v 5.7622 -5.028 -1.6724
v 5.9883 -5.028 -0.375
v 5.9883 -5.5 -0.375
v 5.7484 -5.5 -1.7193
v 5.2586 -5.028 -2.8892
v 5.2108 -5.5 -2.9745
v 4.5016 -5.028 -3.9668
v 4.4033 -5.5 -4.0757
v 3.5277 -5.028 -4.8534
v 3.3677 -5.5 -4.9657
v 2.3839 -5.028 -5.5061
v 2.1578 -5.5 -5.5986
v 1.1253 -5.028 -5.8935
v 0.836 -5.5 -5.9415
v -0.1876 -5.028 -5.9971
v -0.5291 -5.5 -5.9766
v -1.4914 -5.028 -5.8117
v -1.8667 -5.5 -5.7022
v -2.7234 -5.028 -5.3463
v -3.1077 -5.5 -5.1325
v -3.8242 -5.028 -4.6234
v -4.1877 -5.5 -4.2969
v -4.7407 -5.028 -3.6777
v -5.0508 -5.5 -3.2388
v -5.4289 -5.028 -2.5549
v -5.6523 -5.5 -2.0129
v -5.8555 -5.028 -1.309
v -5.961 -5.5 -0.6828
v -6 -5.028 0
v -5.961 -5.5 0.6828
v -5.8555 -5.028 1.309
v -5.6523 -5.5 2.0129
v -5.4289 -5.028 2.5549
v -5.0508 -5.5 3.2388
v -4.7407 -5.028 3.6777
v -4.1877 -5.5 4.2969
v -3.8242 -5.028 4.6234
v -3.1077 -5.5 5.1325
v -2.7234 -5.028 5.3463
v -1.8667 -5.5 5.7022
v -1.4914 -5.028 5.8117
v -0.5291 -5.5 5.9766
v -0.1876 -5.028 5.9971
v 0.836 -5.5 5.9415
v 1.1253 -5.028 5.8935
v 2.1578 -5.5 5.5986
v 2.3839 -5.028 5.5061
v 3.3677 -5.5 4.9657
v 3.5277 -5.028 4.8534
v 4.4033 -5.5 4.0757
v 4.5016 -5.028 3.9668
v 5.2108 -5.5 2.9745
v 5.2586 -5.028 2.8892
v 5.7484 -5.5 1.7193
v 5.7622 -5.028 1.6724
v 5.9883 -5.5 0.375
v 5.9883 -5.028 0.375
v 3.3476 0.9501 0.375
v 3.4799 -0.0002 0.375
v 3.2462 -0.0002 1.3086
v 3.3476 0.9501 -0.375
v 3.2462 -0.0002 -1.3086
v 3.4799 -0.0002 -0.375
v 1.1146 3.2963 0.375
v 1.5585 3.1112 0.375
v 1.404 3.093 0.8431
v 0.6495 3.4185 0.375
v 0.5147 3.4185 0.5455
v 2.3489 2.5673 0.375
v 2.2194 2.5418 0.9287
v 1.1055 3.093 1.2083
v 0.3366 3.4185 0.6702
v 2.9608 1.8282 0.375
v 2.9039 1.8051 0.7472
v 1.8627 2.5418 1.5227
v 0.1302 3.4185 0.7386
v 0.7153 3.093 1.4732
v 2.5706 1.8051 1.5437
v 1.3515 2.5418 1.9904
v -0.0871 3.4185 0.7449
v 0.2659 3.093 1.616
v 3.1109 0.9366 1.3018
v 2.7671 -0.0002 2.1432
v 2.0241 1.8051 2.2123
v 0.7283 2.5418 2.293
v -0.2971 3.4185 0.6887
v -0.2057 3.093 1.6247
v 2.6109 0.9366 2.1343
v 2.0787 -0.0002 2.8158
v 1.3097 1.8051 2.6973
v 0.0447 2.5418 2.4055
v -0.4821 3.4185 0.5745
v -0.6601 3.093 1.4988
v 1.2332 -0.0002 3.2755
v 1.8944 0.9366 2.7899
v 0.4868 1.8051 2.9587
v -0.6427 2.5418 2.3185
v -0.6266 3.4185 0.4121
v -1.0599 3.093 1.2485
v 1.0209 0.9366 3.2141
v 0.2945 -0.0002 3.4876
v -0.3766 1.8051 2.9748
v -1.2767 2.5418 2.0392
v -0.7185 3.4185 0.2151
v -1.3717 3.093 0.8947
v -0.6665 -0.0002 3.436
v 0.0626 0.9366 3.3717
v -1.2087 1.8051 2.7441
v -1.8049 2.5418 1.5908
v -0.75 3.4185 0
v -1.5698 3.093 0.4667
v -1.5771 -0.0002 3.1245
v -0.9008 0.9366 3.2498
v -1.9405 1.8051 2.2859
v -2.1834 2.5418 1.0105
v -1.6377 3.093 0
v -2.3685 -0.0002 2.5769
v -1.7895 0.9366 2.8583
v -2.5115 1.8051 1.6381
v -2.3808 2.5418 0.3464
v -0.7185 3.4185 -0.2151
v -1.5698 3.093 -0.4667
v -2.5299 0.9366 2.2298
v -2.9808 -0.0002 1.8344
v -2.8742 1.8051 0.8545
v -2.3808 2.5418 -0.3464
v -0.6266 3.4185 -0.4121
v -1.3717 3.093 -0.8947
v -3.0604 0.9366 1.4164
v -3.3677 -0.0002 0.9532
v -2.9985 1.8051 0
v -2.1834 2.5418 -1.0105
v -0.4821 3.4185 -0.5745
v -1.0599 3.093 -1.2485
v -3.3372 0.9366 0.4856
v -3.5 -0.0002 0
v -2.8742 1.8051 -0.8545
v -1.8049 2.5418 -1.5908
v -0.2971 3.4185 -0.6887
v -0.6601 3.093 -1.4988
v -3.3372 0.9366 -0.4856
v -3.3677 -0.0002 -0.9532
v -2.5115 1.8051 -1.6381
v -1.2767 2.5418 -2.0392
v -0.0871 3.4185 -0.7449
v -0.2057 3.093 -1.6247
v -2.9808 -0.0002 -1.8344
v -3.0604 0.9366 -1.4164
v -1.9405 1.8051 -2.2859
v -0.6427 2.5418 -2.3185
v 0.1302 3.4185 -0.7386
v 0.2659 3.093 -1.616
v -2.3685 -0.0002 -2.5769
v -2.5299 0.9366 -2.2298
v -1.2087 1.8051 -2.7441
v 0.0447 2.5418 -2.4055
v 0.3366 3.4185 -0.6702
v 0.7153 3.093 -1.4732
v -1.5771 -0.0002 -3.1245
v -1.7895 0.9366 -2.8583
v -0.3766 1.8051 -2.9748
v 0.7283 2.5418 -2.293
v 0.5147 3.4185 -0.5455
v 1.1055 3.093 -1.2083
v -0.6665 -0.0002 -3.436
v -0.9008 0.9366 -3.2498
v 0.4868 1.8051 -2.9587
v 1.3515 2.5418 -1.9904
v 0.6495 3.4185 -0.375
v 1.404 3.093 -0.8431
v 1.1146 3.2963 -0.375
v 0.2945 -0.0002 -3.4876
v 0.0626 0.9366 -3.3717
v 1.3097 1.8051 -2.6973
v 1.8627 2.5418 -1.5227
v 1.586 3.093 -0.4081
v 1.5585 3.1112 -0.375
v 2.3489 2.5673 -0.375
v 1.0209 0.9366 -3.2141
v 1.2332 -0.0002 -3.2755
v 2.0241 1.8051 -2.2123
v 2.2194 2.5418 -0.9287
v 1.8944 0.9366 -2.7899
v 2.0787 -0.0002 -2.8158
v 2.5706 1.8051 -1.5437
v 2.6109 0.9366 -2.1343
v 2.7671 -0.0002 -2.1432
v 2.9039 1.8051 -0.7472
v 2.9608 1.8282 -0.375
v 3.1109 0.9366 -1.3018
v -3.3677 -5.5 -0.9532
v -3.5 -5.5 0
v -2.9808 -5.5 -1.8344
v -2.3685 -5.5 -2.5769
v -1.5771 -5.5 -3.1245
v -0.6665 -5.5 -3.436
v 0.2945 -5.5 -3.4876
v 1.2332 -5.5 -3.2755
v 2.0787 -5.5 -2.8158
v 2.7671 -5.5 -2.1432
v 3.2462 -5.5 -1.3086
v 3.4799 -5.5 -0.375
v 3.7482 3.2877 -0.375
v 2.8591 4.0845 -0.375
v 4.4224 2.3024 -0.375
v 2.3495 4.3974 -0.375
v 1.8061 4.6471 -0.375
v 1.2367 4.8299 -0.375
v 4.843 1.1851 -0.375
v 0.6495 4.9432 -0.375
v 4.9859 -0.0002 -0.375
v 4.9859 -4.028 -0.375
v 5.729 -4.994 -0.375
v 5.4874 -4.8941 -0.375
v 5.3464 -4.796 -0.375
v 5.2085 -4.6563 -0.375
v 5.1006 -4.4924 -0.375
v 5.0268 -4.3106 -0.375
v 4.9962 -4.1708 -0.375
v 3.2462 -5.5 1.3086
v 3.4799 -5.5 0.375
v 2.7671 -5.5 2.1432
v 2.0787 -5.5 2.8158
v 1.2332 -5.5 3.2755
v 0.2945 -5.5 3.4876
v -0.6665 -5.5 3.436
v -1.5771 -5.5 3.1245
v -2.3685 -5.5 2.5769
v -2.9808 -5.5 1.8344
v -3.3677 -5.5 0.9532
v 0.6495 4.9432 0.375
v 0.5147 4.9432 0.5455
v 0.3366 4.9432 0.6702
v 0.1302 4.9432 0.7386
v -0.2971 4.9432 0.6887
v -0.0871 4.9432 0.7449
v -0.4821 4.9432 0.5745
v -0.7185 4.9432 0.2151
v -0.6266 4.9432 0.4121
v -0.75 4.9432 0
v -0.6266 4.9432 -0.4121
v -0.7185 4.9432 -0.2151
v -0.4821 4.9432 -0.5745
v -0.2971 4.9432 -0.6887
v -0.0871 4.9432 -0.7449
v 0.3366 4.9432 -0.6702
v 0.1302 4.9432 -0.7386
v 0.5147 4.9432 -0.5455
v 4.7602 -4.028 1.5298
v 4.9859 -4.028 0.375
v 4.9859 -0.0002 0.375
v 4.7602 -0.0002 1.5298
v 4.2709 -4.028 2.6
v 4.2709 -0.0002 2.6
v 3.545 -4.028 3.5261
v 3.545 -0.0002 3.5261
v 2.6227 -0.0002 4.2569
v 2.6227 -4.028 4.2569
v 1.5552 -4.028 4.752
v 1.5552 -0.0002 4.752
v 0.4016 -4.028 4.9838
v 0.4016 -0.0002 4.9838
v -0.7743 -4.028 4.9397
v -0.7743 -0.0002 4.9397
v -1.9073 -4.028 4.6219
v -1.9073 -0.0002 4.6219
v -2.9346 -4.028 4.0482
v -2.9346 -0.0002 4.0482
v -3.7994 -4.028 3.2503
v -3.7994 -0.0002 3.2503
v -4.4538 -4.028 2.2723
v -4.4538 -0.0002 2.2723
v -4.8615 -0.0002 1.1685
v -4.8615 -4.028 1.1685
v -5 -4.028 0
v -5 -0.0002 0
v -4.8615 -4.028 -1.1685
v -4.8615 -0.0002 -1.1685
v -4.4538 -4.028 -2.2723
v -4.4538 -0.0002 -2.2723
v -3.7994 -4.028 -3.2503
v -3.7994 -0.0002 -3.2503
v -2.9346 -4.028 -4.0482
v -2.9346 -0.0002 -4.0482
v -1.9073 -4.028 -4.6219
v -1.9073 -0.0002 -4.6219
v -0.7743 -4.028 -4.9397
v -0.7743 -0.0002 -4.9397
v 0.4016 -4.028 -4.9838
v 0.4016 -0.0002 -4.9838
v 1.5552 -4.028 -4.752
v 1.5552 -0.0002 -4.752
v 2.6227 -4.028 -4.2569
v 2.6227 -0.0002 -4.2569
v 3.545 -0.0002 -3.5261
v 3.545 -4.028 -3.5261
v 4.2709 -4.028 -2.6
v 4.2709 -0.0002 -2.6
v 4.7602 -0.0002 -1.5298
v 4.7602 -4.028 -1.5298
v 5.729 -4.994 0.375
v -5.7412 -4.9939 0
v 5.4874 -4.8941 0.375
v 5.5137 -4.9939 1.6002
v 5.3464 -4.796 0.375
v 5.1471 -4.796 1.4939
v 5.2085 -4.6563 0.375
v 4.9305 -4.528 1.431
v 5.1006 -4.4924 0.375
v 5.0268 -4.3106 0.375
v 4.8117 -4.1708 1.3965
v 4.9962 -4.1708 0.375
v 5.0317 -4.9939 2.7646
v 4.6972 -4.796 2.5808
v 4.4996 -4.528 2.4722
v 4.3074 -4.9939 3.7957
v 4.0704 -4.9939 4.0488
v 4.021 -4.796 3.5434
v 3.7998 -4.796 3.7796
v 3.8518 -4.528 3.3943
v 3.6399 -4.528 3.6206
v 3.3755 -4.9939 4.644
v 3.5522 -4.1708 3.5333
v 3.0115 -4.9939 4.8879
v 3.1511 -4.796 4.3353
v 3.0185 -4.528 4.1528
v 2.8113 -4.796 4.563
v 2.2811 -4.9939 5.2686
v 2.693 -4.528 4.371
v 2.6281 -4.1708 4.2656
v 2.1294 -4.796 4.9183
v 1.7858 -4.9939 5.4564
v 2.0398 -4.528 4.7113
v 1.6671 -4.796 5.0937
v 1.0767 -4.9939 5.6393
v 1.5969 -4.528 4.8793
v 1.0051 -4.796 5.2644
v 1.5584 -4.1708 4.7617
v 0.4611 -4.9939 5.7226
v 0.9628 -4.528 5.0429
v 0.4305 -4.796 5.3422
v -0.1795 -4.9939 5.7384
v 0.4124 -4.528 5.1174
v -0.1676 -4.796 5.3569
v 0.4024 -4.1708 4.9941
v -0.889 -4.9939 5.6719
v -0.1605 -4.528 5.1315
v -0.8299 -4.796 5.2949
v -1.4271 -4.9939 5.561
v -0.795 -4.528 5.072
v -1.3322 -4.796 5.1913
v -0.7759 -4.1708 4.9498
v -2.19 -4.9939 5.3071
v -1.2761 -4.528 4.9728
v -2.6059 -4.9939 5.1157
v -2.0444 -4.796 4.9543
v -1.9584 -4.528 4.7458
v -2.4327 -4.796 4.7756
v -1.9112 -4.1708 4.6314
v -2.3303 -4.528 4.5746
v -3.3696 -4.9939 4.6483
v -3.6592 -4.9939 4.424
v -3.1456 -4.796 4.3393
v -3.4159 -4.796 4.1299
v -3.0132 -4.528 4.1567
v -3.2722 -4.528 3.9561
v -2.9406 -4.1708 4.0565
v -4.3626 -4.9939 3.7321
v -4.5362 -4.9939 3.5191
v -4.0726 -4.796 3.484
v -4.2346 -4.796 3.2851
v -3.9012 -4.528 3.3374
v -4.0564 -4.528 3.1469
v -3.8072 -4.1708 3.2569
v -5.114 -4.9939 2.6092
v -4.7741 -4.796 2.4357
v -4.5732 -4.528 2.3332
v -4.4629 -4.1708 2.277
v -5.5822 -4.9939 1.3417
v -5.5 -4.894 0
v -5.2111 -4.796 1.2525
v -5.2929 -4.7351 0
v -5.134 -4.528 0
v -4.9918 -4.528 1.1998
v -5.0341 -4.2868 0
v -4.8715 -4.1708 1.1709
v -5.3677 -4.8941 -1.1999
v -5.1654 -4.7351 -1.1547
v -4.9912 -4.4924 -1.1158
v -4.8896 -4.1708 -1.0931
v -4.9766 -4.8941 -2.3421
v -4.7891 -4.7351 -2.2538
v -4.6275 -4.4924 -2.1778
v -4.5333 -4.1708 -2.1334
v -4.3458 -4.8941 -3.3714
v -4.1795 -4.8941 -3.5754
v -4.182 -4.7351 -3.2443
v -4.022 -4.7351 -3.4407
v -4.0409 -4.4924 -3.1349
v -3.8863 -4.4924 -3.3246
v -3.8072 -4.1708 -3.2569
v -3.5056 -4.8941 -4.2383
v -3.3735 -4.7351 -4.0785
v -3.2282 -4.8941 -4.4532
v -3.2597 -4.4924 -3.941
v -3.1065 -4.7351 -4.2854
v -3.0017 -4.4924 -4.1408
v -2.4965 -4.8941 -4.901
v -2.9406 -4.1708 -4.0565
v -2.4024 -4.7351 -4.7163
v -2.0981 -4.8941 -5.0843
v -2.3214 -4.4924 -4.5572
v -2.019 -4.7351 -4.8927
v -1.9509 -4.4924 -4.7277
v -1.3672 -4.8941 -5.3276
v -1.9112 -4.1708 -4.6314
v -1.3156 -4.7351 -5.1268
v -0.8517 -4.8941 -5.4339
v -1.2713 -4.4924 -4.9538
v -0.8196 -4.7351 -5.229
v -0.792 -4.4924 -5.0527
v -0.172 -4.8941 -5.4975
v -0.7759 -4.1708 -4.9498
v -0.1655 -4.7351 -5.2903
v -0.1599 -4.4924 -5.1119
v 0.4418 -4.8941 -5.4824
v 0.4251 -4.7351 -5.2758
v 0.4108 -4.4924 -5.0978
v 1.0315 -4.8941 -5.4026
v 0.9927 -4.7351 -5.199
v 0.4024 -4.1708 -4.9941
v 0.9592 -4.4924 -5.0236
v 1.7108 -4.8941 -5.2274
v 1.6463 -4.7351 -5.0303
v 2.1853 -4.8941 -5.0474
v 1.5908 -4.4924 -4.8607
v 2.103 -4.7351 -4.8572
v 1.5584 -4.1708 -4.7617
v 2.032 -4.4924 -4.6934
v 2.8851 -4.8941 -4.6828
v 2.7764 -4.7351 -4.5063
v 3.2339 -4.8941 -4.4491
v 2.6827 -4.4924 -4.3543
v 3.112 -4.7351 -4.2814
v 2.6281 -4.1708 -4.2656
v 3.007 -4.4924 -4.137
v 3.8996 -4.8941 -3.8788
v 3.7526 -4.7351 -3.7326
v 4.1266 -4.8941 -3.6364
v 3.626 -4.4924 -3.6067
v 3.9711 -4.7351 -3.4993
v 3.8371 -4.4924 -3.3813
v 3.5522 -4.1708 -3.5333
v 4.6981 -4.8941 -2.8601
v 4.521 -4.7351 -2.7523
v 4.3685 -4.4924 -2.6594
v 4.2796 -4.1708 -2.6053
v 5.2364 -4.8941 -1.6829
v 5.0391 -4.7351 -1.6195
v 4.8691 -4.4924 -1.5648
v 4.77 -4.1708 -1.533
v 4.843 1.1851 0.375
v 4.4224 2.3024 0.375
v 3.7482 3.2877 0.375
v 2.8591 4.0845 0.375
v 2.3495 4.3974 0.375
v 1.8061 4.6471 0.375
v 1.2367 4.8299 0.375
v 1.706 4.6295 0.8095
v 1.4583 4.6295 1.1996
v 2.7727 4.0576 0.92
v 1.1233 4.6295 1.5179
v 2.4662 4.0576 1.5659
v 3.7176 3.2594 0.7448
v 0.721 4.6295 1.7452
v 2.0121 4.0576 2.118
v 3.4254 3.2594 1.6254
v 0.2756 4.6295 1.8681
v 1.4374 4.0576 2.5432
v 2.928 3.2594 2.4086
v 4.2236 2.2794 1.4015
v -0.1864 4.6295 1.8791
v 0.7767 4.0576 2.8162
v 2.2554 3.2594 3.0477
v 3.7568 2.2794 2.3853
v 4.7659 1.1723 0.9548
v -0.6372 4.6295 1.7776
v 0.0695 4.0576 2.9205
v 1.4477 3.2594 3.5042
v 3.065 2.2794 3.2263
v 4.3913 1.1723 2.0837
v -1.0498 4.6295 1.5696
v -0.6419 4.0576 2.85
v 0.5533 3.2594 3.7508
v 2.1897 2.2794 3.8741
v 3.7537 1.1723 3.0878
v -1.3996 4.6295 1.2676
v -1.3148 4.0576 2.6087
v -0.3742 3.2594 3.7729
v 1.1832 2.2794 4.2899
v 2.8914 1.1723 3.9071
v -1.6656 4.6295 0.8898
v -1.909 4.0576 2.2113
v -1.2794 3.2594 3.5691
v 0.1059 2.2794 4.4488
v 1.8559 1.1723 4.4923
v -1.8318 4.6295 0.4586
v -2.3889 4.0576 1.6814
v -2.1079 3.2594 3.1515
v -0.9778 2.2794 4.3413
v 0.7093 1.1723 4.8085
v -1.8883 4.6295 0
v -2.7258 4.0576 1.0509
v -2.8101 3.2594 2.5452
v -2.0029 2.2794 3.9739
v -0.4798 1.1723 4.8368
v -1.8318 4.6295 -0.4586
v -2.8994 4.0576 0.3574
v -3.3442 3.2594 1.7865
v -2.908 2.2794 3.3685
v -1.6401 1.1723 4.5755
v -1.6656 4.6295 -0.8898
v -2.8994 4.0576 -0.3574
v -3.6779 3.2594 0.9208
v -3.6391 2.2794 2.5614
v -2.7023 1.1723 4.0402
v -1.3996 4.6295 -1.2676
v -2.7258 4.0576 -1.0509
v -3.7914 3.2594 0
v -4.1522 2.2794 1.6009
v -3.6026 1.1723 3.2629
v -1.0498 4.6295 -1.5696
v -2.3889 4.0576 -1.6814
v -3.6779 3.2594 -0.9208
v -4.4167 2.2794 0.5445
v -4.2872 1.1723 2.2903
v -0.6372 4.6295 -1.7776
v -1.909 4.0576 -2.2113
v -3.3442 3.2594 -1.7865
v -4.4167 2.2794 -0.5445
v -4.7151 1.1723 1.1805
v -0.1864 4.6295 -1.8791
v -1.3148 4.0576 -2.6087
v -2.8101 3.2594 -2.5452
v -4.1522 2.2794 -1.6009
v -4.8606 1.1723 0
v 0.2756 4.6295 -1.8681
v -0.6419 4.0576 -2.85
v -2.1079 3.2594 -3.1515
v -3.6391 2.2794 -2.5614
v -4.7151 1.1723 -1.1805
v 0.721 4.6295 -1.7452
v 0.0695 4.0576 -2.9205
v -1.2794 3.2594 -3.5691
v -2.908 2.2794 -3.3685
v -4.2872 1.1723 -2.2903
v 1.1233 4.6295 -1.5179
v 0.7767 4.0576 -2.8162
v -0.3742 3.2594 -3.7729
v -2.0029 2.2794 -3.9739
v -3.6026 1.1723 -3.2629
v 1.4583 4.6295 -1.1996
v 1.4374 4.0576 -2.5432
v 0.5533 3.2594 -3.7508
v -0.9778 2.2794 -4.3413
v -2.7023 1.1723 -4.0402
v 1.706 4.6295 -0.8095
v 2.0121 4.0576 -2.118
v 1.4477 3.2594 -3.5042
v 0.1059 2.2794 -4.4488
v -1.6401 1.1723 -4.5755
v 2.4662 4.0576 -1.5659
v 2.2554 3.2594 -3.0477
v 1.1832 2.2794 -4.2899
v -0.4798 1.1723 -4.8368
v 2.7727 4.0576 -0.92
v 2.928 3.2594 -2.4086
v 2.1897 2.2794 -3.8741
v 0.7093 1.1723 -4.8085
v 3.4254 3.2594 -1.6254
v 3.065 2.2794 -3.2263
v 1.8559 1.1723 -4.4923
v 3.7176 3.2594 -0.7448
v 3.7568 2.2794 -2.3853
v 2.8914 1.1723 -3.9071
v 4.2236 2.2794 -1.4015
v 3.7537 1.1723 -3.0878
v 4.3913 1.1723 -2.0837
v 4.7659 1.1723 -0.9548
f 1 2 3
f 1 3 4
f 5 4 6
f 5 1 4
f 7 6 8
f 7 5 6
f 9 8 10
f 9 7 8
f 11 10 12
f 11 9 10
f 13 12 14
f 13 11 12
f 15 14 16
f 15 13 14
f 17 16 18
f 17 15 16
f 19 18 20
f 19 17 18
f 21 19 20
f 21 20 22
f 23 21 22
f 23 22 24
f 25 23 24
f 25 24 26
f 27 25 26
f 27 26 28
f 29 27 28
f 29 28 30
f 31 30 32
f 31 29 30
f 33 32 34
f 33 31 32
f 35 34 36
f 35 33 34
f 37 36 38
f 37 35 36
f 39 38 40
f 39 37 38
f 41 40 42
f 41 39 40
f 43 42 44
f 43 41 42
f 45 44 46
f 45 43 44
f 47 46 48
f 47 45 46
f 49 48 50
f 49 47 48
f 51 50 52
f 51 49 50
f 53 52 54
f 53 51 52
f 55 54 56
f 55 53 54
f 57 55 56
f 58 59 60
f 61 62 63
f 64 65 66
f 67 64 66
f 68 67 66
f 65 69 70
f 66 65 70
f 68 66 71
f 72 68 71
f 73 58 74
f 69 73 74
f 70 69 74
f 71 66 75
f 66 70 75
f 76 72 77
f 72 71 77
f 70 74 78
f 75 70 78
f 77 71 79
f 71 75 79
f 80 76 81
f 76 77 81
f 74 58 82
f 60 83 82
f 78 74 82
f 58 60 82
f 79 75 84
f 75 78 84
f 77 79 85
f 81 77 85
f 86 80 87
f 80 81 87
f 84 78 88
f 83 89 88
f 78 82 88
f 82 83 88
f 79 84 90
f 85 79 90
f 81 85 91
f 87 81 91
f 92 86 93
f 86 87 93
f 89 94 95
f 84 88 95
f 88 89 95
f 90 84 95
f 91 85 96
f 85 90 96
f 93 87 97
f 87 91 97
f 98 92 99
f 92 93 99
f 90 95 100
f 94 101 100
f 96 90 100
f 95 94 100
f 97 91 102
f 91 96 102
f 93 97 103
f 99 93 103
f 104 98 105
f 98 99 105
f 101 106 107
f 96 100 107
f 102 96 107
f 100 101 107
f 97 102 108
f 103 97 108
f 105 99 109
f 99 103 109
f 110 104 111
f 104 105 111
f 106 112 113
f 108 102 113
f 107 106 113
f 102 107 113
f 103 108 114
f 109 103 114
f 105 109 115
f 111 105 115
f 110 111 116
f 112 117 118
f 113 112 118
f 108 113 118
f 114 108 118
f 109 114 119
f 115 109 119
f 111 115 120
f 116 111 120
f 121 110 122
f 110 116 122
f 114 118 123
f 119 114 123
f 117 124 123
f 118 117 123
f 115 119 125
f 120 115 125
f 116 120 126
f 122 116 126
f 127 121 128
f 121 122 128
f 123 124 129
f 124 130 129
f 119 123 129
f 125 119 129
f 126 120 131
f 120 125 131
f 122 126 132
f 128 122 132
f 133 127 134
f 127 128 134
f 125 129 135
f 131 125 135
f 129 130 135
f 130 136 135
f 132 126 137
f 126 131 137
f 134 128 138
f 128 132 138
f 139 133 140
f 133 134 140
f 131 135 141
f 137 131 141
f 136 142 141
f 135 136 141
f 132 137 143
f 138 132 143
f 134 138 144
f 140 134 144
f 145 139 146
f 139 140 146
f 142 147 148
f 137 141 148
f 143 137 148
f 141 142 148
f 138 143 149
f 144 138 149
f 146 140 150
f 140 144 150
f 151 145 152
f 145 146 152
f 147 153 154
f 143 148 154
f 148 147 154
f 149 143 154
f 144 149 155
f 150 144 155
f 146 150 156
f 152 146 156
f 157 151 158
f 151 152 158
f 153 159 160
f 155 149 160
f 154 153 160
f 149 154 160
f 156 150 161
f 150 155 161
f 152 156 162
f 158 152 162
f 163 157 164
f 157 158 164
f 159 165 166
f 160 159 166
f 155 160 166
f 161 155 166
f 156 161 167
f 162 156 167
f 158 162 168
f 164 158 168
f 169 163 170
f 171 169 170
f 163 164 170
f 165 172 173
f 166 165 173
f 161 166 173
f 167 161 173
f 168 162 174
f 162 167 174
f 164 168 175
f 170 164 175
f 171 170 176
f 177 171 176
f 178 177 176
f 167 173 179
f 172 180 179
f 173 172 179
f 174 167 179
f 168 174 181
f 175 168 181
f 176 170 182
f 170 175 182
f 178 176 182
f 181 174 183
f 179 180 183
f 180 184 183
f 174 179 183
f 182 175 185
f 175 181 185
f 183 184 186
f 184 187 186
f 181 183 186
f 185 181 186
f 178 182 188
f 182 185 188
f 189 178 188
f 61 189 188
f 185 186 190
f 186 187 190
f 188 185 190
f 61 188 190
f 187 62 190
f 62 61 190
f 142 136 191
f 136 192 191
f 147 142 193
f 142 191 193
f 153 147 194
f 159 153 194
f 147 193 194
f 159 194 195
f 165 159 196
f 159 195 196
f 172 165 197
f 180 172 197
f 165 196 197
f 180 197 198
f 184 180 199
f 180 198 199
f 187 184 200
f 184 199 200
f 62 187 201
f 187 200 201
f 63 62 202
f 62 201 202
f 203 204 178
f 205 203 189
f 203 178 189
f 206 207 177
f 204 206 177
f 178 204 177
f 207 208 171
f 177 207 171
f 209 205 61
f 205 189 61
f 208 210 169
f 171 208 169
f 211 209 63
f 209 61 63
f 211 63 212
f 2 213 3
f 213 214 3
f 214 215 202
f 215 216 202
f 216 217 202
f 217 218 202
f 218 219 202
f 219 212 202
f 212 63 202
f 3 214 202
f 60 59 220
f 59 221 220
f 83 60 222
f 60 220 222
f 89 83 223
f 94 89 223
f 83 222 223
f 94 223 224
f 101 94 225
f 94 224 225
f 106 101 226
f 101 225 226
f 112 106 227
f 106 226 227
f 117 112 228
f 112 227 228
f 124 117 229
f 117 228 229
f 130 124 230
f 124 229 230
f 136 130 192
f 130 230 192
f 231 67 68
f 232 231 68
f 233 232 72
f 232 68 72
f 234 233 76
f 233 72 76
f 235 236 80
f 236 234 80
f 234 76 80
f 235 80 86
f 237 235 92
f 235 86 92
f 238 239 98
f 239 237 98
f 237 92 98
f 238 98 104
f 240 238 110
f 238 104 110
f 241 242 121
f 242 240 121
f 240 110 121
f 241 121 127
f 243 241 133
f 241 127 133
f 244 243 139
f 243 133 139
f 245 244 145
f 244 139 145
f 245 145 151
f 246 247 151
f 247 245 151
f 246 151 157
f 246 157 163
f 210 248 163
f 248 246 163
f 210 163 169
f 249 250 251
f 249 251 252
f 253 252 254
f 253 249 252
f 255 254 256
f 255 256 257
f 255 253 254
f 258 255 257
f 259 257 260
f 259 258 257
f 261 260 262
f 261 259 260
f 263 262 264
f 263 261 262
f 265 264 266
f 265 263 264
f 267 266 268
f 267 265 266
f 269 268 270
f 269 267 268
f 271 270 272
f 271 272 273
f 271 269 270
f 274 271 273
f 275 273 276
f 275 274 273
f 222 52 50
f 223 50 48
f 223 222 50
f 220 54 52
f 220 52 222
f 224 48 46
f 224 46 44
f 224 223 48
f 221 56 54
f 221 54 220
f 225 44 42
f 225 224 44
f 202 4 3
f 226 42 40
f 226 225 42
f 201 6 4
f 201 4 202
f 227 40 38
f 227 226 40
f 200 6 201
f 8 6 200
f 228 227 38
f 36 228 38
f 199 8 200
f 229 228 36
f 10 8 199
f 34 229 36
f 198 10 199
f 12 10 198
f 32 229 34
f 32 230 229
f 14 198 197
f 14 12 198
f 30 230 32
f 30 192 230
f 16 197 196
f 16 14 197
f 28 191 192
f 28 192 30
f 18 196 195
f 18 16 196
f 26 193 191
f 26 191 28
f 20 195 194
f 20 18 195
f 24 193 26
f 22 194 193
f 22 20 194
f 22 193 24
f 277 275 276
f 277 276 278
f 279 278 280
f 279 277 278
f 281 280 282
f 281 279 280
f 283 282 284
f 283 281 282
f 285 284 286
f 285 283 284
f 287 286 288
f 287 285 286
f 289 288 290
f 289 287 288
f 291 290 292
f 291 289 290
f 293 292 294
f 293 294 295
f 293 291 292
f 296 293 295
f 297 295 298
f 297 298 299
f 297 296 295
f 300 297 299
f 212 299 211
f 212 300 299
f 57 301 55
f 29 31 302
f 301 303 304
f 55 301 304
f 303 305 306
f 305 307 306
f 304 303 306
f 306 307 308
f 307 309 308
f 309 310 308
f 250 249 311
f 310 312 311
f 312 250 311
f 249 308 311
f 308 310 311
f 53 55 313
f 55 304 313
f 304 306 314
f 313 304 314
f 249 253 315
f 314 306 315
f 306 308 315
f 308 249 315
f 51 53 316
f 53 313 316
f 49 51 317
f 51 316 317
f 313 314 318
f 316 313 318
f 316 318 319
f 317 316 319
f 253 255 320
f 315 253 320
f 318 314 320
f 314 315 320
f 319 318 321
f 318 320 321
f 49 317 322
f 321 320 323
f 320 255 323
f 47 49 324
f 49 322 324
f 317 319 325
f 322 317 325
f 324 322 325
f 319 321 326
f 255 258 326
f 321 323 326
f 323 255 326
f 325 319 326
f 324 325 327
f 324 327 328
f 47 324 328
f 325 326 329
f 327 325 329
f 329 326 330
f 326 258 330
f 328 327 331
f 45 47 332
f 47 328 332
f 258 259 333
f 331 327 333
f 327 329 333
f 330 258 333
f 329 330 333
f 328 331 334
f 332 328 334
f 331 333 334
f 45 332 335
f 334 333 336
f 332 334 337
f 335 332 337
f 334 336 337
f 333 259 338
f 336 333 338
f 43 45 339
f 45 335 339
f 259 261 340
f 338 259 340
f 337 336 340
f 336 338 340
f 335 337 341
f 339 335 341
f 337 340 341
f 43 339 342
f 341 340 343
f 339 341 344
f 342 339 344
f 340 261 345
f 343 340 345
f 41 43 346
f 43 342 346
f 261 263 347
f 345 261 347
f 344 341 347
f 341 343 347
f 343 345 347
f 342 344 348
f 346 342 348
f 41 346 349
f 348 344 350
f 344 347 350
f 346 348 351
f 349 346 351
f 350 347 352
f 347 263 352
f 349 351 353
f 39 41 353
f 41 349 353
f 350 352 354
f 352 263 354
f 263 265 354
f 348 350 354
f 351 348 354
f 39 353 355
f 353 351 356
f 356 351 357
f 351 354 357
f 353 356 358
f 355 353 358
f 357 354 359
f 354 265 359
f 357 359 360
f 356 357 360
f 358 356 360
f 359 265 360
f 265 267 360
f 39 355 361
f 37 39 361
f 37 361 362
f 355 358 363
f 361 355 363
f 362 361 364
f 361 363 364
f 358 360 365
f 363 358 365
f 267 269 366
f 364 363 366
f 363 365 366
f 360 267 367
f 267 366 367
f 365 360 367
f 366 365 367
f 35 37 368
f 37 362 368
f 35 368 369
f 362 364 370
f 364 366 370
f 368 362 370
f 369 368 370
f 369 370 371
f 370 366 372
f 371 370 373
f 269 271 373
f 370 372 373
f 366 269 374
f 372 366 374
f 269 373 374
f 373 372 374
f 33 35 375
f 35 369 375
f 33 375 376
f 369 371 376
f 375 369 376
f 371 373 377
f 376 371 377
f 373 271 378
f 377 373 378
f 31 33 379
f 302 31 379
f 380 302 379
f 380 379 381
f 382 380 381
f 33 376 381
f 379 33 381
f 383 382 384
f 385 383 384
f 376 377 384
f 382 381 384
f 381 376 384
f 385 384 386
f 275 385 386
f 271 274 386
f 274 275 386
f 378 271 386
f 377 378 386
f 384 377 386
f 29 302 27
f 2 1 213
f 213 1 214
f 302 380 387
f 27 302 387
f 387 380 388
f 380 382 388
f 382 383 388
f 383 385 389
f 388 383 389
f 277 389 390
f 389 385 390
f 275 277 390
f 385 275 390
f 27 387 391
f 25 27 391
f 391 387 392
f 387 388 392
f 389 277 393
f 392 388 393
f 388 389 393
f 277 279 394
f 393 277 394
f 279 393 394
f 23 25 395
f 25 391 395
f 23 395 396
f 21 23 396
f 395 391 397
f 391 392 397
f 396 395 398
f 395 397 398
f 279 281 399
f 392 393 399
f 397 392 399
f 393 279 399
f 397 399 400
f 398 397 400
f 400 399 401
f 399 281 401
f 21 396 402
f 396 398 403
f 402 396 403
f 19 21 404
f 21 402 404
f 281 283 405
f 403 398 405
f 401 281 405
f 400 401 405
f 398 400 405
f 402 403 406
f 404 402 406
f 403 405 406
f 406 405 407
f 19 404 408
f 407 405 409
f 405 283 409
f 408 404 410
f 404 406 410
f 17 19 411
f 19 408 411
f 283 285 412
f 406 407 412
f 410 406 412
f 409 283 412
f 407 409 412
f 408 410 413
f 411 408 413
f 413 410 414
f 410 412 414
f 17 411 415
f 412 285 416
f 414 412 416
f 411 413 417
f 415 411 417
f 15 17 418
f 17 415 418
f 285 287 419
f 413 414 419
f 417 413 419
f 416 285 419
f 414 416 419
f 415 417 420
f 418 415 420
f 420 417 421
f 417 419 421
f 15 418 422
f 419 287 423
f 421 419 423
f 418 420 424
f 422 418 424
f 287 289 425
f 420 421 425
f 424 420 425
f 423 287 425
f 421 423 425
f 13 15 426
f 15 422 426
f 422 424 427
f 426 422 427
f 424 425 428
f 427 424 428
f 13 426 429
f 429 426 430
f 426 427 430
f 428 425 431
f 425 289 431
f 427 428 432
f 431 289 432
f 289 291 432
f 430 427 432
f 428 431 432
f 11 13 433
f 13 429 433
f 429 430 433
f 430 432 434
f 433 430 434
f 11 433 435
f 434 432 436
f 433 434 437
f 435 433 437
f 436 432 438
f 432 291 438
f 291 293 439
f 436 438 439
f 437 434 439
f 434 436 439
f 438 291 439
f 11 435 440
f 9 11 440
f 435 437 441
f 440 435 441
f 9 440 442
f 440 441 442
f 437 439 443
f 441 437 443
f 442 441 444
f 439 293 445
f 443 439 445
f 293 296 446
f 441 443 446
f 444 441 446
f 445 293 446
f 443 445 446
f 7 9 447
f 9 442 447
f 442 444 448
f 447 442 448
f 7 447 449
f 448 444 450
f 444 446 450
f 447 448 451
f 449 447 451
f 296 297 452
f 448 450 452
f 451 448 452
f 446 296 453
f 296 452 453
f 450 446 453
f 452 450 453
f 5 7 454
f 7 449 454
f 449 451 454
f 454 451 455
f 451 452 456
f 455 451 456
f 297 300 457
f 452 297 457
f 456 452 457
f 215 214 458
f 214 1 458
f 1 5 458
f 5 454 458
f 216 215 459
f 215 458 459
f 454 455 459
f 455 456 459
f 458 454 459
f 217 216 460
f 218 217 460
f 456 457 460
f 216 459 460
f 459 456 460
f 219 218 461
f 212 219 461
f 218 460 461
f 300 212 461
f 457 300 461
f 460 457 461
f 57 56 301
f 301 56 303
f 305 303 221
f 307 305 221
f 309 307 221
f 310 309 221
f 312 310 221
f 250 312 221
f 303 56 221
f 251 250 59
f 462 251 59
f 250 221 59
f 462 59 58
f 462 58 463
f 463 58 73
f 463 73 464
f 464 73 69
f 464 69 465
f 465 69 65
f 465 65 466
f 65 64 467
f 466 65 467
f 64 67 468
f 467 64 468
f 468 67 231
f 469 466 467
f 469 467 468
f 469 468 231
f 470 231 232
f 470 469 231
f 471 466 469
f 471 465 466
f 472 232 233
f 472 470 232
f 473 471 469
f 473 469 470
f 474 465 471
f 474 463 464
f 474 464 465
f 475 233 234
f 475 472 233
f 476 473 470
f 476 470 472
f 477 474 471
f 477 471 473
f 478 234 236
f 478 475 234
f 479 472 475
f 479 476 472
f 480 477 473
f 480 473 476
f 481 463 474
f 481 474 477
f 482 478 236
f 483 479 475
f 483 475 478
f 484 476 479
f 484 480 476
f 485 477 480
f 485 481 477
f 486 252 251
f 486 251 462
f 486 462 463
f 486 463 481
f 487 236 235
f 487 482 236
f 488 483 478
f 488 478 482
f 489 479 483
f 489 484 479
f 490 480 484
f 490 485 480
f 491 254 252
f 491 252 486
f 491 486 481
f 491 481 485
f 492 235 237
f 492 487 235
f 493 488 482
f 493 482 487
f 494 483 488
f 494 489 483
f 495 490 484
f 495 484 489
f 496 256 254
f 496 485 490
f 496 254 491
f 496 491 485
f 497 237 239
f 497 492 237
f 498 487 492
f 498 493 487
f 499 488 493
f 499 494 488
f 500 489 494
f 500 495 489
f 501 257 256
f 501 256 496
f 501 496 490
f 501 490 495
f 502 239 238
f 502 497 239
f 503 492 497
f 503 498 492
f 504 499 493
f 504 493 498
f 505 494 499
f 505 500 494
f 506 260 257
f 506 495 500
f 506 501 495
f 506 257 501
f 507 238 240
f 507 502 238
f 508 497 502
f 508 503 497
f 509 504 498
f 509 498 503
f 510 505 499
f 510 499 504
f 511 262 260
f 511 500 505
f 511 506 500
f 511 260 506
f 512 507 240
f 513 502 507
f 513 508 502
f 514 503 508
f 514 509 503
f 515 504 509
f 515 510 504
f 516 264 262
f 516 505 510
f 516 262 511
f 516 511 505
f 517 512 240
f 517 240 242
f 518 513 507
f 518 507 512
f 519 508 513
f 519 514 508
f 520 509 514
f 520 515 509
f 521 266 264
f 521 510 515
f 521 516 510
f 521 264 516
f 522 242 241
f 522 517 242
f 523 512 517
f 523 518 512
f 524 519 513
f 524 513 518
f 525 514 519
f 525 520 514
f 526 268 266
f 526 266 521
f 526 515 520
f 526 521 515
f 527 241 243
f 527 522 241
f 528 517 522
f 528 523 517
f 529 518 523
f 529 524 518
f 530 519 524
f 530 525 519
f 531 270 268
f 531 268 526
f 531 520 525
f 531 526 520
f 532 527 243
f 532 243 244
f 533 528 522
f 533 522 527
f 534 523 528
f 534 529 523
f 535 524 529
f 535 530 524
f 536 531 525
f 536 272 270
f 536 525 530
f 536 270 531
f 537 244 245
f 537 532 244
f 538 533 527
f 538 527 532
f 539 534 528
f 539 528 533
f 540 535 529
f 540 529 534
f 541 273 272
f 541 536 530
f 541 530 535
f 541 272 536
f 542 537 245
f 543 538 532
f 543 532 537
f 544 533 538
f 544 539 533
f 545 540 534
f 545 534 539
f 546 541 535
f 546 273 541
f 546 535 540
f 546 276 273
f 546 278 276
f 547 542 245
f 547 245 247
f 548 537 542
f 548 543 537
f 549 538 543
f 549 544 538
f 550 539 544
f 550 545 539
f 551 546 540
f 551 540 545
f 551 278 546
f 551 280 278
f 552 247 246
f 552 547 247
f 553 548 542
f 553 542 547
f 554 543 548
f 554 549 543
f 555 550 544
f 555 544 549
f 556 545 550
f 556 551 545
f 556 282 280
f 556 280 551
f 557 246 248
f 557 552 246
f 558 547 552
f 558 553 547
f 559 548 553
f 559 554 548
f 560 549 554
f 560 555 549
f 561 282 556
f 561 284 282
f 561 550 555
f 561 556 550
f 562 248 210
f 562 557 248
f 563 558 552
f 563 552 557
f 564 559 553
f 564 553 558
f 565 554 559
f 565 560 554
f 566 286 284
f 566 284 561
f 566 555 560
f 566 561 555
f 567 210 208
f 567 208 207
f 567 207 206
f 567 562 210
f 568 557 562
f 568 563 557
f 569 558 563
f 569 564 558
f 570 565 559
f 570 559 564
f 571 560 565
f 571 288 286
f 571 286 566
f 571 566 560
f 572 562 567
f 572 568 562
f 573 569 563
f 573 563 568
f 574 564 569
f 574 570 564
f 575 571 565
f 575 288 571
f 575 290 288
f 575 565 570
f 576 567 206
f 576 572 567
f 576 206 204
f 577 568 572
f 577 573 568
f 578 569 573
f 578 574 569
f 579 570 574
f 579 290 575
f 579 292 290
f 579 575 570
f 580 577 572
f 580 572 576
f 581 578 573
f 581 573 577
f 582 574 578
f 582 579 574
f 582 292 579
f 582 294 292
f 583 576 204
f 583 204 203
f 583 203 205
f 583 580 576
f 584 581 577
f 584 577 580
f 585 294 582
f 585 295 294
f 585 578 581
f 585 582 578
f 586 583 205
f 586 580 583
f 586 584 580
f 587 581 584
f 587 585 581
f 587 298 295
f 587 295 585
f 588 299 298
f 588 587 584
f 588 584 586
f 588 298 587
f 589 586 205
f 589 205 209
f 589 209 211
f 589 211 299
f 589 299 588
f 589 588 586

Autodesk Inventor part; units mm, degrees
ref_plane "YZ Plane" through (0, 0, 0) normal (1, 0, 0) x (0, 1, 0)
ref_plane "XZ Plane" through (0, 0, 0) normal (0, 1, 0) x (-1, 0, 0)
ref_plane "XY Plane" through (0, 0, 0) normal (0, 0, 1) x (1, 0, 0)
sketch "Sketch1" plane through (0, 0, 0) normal (0, 0, 1) x (1, 0, 0)
  arc A0 (0, 4.9998) -> (-5, -0.0002) centre (0, -0.0002) ccw
  arc A1 (-6, -5.028) -> (-5, -4.028) centre (-6, -4.028) ccw
  line L0 (0, -5.5) -> (-6, -5.5)
  line L1 (-6, -5.5) -> (-6, -5.028)
  line L2 (-5, -0.0002) -> (-5, -4.028)
  arc A2 (0, 3.4998) -> (-3.5, -0.0002) centre (0, -0.0002) ccw
  line L3 (-3.5, -0.0002) -> (-3.5, -5.5)
  line L4 (0, 4.9998) -> (0, -5.5)
  point P0 (0, 0)
  dimension "d7" = 90
  dimension "d9" = 6
  dimension "d13" = 1
  dimension "d16" = 10.4998
  dimension "d17" = 5
  dimension "d18" = 3.5
  dimension "d19" = 90
  dimension "d21" = 5.5
  dimension "d22" = 5
  dimension "d23" = 3.5
revolve "Revolution1" add sketch "Sketch1" angle 360 about axis through (0, 4.9998, 0) along (0, -1, 0) contours L4 A2 L3 L0 L1 A1 L2 A0
sketch "Sketch2" plane through (0, 0, 0) normal (0, 1, 0) x (-1, 0, 0)
  point P0 (0, 0)
sketch "Sketch3" plane through (0, 0, 0) normal (0, 1, 0) x (-1, 0, 0)
  circle A0 centre (0, 0) radius 0.75
  dimension "d25" = 1.5
extrude "Extrusion1" cut sketch "Sketch3" along normal up to surface
sketch "Sketch4" plane through (0, 0, 0) normal (1, 0, 0) x (0, 1, 0)
  line L0 (-5.5, -6) -> (-5.5, 6) projected
  line L1 (5.5, -0.375) -> (-5.5, -0.375)
  line L2 (-5.5, -0.375) -> (-5.5, 0.375)
  line L3 (-5.5, 0.375) -> (5.5, 0.375)
  line L4 (5.5, 0.375) -> (5.5, -0.375)
  line L5 (5.5, -0.375) -> (-5.5, 0.375) construction
  line L6 (-5.5, -0.375) -> (5.5, 0.375) construction
  point P0 (0, 0)
  dimension "d28" = 0.75
extrude "Extrusion2" cut sketch "Sketch4" along normal up to surface
properties part number "Puller"
